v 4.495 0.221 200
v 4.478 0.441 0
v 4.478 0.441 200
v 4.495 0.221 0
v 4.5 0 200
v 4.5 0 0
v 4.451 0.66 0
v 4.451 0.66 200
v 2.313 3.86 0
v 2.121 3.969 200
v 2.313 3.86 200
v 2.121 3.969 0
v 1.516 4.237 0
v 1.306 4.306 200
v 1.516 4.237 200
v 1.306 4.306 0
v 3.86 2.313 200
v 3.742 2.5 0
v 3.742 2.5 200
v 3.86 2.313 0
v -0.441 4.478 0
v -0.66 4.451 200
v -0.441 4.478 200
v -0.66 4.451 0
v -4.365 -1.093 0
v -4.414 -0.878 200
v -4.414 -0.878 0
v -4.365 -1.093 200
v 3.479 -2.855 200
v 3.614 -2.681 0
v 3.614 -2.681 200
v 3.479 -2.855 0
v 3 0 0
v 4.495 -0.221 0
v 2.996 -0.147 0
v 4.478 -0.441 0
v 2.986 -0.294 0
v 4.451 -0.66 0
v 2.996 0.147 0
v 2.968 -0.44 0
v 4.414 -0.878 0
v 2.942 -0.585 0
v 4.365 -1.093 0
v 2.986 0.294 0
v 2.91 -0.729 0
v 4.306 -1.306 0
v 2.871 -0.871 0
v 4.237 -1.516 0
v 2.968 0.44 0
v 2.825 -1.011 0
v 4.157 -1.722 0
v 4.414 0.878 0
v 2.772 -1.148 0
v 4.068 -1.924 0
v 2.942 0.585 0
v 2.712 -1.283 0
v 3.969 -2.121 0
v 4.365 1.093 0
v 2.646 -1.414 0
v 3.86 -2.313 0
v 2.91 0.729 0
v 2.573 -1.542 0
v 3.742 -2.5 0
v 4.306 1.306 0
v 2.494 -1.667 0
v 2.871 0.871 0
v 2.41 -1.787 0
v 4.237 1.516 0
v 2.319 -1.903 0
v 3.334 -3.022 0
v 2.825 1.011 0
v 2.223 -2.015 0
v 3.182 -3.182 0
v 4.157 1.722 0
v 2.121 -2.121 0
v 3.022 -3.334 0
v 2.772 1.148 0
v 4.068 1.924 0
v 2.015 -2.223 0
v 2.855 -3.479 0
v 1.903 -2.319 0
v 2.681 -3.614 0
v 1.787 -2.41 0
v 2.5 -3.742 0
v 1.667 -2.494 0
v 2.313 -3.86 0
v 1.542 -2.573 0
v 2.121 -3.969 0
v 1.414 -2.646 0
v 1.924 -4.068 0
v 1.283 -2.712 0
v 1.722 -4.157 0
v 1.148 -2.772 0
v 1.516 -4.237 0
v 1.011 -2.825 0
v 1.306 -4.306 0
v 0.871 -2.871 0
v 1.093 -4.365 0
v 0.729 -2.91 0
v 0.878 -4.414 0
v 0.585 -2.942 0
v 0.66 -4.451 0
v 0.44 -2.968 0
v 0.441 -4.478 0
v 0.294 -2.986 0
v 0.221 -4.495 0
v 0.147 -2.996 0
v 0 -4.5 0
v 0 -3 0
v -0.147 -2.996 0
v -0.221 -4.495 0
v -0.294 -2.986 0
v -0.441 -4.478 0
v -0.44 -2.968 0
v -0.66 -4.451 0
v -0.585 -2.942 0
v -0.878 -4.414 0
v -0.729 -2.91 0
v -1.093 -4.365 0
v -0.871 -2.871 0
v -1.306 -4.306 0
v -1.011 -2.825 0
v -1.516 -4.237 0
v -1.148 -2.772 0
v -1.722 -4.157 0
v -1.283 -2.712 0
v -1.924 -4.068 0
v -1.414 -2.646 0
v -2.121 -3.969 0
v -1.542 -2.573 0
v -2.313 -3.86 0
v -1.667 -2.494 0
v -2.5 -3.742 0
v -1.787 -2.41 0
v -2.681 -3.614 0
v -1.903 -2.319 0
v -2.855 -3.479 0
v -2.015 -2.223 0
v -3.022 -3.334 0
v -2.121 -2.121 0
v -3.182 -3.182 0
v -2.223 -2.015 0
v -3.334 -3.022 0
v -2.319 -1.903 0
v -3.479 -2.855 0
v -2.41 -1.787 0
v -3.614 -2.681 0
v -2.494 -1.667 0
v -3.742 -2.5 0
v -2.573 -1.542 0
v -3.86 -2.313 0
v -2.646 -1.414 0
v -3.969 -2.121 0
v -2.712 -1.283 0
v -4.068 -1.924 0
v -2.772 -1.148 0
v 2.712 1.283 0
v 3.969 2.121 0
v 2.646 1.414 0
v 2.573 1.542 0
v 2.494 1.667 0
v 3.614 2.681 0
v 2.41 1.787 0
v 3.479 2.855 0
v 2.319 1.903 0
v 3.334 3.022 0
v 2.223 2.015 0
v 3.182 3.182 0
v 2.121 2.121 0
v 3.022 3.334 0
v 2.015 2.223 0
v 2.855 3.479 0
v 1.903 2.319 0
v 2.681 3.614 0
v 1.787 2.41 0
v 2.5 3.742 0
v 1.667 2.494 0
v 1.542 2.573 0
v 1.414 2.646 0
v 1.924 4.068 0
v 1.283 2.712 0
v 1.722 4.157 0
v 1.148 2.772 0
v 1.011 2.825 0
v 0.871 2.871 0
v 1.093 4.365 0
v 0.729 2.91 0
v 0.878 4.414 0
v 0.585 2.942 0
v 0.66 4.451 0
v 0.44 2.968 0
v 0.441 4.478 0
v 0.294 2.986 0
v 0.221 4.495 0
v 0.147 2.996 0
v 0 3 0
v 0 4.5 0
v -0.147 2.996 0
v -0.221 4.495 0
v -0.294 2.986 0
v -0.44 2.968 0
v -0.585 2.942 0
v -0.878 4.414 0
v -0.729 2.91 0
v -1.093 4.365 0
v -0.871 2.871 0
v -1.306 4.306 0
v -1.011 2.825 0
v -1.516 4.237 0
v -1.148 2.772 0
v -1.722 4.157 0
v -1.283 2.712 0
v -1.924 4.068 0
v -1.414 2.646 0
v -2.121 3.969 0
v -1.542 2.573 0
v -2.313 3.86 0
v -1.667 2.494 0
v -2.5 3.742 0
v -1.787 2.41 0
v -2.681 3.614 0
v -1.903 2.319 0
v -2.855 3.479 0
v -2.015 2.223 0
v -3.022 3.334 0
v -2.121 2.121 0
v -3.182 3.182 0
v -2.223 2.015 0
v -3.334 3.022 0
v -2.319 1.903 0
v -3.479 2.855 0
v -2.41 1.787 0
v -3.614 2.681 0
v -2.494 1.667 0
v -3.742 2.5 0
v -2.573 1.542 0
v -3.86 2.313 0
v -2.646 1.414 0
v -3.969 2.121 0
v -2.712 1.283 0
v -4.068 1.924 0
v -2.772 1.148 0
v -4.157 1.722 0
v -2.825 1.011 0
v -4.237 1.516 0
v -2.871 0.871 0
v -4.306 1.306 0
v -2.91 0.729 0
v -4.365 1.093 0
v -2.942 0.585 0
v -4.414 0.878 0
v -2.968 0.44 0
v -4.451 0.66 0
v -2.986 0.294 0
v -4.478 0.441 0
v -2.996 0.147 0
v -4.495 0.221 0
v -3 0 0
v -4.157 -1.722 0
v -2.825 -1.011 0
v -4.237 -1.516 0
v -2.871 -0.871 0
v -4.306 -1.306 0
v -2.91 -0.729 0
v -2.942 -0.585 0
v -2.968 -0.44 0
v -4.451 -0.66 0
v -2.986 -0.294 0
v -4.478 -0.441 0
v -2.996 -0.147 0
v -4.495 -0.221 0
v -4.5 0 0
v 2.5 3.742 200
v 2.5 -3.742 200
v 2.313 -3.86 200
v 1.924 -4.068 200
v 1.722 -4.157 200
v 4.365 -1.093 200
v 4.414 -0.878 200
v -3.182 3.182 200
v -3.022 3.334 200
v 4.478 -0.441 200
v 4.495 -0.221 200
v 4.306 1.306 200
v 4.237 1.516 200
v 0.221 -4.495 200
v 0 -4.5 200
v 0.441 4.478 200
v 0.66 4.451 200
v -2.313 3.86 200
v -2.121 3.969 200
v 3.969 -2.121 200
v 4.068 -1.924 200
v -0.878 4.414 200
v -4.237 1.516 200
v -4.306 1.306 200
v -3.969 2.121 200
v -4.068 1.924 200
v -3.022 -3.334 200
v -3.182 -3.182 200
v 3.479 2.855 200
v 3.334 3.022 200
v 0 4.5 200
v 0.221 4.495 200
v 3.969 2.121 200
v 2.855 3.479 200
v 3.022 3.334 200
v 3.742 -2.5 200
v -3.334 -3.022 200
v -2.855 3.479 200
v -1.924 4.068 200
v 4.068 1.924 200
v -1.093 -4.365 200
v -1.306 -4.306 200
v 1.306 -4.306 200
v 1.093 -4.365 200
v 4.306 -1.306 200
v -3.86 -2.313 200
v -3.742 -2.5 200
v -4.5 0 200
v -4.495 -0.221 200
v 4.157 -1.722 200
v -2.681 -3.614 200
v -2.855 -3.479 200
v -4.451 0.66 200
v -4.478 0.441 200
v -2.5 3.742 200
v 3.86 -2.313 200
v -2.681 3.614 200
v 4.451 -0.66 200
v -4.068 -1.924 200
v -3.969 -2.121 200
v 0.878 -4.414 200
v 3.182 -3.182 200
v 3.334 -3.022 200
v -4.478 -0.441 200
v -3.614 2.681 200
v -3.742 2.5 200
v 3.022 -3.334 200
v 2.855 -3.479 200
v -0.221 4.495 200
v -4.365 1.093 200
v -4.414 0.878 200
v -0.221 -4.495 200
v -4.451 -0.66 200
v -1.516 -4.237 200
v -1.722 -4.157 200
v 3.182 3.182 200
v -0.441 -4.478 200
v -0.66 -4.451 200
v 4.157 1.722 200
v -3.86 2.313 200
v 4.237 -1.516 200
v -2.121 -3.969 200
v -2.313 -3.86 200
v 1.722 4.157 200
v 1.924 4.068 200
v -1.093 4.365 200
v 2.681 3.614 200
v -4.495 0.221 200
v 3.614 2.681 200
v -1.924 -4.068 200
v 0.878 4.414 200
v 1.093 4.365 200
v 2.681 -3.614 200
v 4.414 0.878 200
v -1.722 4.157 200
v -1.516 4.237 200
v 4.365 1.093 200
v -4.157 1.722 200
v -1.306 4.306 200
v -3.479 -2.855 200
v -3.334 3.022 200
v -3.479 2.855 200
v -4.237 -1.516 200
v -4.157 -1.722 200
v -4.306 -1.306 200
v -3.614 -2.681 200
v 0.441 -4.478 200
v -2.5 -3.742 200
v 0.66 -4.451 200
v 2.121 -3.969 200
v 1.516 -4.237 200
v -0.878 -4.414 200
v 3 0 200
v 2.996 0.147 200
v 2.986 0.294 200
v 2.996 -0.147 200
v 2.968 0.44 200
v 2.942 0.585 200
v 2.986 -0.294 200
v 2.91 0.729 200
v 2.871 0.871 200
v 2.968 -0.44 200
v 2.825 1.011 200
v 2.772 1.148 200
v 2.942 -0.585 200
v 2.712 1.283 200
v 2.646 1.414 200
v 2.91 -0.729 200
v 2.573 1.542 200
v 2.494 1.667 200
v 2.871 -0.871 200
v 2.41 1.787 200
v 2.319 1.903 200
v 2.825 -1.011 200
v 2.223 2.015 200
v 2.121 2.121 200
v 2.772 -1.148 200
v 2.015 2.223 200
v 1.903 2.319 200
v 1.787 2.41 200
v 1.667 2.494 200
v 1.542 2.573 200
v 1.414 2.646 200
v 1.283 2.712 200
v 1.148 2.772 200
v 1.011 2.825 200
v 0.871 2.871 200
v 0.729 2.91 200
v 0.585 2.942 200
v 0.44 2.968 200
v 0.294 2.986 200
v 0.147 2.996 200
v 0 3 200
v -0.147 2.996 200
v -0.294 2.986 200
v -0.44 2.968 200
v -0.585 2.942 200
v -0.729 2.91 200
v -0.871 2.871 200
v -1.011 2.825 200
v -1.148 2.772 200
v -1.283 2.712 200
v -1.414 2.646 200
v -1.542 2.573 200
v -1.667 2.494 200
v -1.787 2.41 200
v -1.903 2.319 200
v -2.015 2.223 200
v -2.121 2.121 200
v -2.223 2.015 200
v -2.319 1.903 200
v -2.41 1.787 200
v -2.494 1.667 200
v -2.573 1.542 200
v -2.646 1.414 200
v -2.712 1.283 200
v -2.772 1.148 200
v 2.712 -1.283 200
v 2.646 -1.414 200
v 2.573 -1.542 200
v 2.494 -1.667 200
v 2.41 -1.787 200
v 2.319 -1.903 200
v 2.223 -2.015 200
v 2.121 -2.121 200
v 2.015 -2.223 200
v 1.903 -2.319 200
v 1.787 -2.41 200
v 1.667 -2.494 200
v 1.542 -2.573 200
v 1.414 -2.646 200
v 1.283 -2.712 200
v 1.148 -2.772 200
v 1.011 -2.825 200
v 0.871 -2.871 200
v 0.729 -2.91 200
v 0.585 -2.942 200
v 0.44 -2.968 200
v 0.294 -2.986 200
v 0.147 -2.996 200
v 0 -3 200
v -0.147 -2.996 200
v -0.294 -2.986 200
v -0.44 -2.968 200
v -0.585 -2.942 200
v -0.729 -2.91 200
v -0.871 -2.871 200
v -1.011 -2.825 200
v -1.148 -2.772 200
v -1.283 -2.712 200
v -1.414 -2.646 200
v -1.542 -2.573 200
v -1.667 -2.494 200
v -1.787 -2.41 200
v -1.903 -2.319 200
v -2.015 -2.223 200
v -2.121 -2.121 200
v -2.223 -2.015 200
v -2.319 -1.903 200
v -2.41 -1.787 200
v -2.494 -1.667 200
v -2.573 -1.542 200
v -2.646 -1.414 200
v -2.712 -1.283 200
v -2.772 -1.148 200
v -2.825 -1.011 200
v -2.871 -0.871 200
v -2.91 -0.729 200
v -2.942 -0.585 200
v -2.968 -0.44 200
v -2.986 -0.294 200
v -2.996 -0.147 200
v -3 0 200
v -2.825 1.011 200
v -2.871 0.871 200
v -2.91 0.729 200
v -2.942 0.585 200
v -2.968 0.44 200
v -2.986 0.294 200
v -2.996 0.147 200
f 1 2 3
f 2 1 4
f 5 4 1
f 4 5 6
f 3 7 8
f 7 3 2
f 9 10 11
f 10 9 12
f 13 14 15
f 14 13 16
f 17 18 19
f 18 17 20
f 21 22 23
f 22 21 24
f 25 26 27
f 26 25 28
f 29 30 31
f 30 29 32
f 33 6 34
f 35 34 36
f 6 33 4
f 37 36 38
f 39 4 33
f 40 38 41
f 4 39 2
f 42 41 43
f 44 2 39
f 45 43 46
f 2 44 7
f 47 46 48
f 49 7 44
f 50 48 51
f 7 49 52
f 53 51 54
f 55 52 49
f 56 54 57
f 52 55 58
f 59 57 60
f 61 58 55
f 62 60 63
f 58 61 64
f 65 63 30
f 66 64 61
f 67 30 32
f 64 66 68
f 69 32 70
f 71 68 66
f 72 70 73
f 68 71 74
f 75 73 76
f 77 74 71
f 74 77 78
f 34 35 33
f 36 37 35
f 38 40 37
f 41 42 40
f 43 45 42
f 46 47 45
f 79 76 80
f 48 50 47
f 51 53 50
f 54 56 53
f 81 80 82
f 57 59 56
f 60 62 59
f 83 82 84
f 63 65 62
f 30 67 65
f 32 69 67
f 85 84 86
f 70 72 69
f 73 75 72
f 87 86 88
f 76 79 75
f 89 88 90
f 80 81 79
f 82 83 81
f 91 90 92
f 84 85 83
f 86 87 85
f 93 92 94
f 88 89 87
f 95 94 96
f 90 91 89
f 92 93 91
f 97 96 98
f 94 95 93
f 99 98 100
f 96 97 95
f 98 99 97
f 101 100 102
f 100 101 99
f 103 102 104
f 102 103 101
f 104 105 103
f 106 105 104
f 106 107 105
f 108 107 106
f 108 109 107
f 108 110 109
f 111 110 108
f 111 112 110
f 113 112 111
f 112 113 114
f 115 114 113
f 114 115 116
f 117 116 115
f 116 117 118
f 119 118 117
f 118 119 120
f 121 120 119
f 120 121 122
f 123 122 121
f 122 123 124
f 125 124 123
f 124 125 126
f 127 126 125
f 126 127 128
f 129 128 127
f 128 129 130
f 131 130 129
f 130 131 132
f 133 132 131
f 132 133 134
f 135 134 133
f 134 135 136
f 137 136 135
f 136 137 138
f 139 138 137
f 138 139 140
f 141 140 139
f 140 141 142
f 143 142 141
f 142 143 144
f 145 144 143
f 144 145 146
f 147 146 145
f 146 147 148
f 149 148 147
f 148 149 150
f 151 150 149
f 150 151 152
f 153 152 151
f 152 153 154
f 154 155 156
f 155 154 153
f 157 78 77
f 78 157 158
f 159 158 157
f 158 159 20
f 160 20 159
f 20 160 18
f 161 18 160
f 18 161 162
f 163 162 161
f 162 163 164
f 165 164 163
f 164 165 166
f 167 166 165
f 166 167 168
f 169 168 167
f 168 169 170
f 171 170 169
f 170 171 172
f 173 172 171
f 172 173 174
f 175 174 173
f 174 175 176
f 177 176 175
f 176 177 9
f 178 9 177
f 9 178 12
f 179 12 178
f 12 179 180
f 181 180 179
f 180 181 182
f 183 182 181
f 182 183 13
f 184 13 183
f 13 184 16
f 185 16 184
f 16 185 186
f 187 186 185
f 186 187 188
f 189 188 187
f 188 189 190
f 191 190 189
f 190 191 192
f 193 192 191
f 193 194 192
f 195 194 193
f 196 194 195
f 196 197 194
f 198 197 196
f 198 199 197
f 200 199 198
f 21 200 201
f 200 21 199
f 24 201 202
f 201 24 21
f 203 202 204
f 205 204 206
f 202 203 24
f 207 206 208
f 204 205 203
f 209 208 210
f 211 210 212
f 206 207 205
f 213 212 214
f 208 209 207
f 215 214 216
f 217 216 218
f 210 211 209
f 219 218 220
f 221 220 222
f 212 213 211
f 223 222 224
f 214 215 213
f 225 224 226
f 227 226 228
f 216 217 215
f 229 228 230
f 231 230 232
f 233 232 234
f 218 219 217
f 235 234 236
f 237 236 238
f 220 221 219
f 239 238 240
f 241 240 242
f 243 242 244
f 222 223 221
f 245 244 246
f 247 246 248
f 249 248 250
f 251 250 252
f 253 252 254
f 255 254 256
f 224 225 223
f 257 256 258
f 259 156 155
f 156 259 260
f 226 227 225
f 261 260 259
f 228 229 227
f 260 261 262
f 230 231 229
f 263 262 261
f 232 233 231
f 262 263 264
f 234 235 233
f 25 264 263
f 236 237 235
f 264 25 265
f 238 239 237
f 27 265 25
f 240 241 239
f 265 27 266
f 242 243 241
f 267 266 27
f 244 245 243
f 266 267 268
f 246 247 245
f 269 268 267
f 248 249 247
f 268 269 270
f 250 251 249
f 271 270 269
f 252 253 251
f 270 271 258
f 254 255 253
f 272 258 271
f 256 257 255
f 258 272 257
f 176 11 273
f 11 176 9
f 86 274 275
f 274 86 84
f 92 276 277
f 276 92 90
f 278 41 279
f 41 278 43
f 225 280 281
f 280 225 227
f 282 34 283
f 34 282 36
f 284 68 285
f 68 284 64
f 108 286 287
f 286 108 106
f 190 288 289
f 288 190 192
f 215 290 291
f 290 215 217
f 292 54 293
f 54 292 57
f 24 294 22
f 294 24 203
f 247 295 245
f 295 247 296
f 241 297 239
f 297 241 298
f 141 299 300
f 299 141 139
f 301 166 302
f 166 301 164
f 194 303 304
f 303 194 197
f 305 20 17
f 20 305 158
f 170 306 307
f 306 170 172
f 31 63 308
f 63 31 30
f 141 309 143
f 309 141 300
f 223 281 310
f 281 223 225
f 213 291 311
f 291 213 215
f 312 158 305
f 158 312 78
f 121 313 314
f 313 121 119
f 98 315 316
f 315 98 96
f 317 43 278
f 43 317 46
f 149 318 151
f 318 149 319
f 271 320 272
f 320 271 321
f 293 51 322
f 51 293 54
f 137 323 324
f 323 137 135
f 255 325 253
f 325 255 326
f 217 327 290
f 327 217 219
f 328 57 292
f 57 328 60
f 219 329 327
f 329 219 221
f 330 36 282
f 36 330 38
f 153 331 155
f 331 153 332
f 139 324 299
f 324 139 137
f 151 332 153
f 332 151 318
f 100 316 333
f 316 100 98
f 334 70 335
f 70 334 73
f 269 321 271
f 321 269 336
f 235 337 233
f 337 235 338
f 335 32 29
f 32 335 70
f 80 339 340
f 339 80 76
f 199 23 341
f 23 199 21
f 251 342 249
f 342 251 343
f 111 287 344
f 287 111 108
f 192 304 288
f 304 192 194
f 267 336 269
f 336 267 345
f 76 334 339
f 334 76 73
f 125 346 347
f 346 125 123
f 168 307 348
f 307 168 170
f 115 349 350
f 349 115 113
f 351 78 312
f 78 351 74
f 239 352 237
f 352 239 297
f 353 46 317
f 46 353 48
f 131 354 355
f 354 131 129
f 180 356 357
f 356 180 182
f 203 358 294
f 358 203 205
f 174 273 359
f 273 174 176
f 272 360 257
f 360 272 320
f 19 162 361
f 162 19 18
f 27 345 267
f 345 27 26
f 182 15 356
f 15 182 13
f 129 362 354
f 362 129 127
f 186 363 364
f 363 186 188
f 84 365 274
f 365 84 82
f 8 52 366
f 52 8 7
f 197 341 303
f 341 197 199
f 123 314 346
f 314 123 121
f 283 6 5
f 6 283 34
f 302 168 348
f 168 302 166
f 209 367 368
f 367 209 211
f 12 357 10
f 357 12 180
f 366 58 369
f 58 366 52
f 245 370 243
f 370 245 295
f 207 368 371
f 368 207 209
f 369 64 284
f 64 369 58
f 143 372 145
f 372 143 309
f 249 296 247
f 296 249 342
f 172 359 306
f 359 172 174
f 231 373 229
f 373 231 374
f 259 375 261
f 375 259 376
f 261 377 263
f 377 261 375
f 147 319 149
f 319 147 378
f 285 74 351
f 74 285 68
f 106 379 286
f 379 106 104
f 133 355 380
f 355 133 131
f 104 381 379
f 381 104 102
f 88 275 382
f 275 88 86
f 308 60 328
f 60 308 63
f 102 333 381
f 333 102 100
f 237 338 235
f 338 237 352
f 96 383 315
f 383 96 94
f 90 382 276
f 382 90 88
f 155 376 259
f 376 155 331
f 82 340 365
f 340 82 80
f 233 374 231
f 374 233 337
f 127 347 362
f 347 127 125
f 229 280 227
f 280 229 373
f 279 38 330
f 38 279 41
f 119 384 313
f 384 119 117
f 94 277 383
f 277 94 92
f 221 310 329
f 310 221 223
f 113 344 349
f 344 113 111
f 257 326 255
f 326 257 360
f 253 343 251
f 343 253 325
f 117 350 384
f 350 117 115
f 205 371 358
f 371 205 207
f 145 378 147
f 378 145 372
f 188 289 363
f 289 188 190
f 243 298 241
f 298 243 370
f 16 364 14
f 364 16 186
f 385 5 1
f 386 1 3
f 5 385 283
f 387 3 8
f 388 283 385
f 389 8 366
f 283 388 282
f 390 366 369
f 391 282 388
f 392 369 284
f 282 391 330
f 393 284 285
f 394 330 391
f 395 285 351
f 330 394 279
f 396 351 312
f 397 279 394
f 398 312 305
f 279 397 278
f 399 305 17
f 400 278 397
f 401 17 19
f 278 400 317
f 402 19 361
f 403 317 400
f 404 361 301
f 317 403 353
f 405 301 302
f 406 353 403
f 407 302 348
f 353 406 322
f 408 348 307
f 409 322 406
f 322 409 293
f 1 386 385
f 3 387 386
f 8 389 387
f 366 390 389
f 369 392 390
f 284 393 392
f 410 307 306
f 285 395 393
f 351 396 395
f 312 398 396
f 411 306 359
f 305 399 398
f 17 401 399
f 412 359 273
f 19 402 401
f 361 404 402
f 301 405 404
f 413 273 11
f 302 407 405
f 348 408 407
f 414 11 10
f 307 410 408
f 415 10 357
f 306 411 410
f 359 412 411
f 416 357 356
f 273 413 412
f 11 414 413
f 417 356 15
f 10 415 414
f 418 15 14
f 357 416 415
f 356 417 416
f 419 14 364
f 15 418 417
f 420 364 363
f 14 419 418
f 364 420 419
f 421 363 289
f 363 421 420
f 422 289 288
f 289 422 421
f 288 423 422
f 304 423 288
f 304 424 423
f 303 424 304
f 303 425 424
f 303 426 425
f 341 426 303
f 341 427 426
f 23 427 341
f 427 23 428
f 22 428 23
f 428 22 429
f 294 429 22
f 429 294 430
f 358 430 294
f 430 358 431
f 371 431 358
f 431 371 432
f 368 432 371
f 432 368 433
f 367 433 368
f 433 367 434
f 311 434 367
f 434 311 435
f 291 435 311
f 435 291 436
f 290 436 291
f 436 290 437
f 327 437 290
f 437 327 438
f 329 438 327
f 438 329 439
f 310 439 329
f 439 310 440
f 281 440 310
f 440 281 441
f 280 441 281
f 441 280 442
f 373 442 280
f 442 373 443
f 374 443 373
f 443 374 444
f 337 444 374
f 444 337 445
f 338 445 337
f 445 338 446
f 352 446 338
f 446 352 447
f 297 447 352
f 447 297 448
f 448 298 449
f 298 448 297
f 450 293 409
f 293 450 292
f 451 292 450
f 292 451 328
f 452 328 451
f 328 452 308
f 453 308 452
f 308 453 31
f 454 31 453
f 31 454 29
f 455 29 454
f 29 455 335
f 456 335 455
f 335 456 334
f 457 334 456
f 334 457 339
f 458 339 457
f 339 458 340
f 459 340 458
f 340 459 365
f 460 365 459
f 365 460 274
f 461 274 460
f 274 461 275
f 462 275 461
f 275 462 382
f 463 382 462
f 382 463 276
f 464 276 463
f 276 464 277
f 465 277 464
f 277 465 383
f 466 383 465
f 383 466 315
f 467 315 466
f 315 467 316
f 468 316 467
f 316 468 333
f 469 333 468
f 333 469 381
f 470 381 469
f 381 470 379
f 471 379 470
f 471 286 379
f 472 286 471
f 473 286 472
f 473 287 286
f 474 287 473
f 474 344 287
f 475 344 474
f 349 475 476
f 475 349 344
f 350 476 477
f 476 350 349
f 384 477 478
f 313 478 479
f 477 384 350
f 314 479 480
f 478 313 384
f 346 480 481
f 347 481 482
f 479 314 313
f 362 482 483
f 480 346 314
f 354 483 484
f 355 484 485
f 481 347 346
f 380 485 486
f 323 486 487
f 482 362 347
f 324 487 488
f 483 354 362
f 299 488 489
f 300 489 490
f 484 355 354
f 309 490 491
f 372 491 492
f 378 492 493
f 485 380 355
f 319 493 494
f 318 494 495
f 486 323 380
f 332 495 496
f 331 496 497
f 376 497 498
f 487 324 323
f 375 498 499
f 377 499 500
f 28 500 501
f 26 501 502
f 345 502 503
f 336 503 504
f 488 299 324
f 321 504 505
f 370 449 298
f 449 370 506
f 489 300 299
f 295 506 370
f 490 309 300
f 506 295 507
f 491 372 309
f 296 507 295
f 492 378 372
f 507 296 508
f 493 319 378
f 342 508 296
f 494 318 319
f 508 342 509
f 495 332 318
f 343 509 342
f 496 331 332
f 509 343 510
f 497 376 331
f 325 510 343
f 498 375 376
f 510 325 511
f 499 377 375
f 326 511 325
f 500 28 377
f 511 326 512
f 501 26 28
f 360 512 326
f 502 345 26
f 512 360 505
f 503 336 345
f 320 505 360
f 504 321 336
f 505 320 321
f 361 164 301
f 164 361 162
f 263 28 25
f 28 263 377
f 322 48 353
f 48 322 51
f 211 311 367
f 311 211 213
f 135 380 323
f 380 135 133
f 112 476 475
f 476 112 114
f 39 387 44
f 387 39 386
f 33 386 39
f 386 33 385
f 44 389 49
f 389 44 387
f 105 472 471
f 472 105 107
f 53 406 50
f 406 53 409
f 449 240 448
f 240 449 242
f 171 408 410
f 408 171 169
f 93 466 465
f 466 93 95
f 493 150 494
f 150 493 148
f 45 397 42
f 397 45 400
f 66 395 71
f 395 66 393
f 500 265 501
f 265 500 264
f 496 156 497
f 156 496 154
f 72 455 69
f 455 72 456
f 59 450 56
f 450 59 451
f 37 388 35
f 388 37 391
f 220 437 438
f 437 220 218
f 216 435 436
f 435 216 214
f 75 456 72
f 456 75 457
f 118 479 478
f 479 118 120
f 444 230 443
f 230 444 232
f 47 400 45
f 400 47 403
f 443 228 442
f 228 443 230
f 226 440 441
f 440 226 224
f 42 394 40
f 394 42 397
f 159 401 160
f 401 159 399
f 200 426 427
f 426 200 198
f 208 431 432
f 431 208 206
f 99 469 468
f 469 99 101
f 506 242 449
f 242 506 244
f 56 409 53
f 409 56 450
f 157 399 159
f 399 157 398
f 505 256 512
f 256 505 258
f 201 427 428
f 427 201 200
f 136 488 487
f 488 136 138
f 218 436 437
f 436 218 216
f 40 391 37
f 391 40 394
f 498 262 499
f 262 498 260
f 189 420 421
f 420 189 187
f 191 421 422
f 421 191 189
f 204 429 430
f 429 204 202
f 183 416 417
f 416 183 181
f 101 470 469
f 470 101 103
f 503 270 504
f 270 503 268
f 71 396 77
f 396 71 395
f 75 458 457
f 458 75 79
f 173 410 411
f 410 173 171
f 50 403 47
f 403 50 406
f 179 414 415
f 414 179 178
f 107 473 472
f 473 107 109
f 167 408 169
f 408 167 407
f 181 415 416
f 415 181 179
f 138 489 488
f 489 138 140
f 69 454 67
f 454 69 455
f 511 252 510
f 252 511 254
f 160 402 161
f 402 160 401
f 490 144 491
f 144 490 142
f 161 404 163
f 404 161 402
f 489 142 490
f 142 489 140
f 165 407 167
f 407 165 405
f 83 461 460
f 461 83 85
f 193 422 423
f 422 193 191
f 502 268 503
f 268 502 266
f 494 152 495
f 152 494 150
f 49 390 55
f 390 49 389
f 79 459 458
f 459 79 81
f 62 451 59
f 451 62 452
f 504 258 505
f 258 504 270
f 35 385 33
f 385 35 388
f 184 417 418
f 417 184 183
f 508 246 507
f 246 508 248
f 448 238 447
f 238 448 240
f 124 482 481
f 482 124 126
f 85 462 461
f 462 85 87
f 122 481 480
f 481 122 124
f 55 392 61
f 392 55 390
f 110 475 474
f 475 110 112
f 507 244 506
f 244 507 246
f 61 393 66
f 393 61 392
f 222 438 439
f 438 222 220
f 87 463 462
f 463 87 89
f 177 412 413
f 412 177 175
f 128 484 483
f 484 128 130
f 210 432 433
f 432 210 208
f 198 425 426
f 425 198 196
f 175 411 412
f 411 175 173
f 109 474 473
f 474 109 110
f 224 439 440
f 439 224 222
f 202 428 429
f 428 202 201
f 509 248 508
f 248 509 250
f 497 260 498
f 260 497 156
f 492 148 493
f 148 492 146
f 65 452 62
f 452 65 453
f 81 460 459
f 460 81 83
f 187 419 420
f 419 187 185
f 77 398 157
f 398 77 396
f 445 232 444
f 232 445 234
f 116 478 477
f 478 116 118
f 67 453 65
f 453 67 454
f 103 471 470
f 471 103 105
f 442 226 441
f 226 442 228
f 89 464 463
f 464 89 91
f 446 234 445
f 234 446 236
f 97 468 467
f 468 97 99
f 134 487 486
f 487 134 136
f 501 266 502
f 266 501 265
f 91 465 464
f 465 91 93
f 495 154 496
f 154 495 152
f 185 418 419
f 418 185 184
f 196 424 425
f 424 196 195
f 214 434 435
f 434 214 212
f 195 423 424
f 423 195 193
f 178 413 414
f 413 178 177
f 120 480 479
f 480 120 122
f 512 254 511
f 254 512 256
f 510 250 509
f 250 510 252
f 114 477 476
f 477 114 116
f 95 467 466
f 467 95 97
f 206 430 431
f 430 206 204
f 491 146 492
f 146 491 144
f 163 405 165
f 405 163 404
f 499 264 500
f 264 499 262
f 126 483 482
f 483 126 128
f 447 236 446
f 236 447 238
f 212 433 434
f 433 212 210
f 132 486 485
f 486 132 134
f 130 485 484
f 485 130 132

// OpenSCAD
$fn = 128;

// PVC aquarium tubing (hollow flexible tube)
inner_d = 6;      // mm
outer_d = 9;      // mm
length  = 200;    // mm

module tubing(od, id, h) {
    difference() {
        cylinder(d=od, h=h);
        translate([0,0,-0.5]) cylinder(d=id, h=h+1);
    }
}

tubing(outer_d, inner_d, length);
